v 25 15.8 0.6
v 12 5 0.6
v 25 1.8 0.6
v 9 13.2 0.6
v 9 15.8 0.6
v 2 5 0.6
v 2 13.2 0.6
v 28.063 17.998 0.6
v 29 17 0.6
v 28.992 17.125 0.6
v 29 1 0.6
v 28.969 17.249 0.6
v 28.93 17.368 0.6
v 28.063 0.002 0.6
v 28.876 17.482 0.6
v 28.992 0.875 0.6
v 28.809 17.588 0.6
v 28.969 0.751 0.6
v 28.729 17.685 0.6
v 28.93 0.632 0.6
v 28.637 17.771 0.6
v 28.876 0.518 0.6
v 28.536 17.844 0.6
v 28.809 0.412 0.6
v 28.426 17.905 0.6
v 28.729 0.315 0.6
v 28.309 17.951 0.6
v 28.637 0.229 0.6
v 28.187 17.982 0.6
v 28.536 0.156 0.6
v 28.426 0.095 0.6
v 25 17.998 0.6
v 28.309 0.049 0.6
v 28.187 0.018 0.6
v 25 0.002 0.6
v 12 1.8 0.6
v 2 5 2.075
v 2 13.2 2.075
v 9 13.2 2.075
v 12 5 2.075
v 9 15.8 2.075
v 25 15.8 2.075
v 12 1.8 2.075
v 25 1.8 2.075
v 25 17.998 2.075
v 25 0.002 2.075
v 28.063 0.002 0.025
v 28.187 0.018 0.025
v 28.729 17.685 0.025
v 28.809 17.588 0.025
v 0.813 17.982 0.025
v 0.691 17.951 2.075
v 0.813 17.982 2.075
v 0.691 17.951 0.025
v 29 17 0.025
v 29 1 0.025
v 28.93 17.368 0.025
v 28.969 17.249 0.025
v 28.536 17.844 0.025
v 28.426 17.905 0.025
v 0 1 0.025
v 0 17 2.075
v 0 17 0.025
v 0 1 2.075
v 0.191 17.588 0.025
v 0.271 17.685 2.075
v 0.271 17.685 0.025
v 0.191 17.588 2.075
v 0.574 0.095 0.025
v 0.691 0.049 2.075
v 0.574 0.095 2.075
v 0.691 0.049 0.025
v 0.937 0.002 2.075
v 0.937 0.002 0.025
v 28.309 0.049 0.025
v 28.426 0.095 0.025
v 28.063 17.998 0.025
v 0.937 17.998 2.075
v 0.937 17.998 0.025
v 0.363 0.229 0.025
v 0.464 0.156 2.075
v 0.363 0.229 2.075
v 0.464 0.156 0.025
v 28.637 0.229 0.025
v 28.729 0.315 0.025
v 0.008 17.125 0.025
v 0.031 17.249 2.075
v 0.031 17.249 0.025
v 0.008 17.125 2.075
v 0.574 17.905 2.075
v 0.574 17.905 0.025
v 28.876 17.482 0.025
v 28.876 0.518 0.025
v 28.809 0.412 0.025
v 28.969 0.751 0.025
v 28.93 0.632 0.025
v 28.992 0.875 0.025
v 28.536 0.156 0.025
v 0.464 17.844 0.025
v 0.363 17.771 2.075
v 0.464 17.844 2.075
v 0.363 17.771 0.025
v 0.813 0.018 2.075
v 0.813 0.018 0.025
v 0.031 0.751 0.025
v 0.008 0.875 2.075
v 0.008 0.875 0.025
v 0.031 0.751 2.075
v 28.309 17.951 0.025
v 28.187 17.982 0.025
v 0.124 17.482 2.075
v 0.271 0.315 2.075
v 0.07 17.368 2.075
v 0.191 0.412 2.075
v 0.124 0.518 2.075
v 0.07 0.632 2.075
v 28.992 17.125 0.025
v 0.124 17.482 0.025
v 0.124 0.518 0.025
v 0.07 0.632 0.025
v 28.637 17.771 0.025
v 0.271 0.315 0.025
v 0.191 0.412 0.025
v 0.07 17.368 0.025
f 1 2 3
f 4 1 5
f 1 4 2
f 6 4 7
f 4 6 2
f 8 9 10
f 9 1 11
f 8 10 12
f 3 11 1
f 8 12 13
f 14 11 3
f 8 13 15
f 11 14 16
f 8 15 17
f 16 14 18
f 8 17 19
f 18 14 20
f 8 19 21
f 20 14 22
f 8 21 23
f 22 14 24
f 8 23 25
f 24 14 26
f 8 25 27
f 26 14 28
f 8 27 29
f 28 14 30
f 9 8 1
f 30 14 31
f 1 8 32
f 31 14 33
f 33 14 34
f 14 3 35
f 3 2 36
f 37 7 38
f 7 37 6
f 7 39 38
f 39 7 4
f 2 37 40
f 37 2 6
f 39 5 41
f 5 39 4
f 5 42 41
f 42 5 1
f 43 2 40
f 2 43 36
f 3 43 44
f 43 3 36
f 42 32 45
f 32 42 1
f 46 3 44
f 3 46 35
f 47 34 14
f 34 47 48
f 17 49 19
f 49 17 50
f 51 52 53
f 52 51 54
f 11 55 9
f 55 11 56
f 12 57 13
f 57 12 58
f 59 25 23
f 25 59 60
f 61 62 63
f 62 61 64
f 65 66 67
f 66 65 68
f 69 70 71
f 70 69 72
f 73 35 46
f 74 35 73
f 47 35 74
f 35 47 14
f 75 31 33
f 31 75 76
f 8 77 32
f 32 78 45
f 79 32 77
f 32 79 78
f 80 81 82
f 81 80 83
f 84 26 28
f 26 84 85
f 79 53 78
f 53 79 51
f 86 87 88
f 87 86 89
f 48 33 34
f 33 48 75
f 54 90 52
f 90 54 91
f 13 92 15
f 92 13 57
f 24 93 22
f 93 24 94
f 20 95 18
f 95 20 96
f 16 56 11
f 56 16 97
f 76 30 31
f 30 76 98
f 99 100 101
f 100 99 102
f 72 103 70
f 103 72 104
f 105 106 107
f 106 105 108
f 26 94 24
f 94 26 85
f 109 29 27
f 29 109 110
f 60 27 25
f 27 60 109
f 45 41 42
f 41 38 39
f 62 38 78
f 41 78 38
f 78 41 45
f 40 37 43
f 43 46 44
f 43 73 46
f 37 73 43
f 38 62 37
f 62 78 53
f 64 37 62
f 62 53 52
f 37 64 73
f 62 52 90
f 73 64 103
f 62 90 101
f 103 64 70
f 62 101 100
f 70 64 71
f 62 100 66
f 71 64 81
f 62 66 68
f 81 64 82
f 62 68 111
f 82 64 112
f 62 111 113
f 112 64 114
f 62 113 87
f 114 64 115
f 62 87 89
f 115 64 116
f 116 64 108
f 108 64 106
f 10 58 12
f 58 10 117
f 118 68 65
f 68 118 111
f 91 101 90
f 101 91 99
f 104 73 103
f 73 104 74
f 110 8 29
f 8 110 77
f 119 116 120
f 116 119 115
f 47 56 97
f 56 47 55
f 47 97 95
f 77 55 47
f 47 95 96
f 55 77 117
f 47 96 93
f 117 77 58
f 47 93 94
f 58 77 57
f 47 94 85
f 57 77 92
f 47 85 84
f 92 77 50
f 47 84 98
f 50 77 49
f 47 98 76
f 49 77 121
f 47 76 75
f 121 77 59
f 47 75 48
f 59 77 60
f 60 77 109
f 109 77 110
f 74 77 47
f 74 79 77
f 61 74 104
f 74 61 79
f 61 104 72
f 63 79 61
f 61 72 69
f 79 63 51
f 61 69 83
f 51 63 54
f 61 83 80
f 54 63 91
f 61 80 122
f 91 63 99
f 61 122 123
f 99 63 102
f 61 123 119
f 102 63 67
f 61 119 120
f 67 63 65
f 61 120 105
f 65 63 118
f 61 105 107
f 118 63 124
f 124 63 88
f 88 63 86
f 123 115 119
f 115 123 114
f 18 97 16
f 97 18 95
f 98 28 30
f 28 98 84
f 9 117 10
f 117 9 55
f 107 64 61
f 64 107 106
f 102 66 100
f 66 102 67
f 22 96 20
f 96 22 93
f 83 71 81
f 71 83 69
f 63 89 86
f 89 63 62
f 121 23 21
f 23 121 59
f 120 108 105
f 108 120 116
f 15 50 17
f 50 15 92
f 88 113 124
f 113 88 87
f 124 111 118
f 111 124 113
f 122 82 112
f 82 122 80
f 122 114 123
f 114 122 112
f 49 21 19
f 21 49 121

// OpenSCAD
// Case for the LANE Boys RC DIY light controller 
//
// Print with 0.2 mm layer height
//
// Modified on 2022-05-12 for compatibility with Mk4 Rev 7 (LPC832, S.Bus)

$fn = 50;
eps = 0.05;

h_bottom = 0.6;
h_middle = 1.5;

h_total = h_bottom + h_middle;

h_cutout = h_middle + eps;

difference() {
    rounded_cube([29, 18, h_total-eps], r=1);

    translate([0, 0, h_bottom]) {
        translate([2, 5, 0]) cube([18, 8.2, h_cutout]);
        translate([9, 5, 0]) cube([18, 10.8, h_cutout]);
        translate([12, 1.8, 0]) cube([14, 5, h_cutout]);
        translate([25, -eps, 0]) cube([10, 18+eps+eps, h_cutout]);
    }
}

module rounded_cube(dim, r=3, center="") {
    d = 2 * r;
    fudge = 0.05;
    
    x = search("x", center) ? 0 : dim.x/2;
    y = search("y", center) ? 0 : dim.y/2;
    z = search("z", center) ? 0 : dim.z/2;
    translate([x, y, z])
        minkowski() {
            cube(dim - [d, d, fudge], true);
            cylinder(r=r, h=fudge);
        }
}
